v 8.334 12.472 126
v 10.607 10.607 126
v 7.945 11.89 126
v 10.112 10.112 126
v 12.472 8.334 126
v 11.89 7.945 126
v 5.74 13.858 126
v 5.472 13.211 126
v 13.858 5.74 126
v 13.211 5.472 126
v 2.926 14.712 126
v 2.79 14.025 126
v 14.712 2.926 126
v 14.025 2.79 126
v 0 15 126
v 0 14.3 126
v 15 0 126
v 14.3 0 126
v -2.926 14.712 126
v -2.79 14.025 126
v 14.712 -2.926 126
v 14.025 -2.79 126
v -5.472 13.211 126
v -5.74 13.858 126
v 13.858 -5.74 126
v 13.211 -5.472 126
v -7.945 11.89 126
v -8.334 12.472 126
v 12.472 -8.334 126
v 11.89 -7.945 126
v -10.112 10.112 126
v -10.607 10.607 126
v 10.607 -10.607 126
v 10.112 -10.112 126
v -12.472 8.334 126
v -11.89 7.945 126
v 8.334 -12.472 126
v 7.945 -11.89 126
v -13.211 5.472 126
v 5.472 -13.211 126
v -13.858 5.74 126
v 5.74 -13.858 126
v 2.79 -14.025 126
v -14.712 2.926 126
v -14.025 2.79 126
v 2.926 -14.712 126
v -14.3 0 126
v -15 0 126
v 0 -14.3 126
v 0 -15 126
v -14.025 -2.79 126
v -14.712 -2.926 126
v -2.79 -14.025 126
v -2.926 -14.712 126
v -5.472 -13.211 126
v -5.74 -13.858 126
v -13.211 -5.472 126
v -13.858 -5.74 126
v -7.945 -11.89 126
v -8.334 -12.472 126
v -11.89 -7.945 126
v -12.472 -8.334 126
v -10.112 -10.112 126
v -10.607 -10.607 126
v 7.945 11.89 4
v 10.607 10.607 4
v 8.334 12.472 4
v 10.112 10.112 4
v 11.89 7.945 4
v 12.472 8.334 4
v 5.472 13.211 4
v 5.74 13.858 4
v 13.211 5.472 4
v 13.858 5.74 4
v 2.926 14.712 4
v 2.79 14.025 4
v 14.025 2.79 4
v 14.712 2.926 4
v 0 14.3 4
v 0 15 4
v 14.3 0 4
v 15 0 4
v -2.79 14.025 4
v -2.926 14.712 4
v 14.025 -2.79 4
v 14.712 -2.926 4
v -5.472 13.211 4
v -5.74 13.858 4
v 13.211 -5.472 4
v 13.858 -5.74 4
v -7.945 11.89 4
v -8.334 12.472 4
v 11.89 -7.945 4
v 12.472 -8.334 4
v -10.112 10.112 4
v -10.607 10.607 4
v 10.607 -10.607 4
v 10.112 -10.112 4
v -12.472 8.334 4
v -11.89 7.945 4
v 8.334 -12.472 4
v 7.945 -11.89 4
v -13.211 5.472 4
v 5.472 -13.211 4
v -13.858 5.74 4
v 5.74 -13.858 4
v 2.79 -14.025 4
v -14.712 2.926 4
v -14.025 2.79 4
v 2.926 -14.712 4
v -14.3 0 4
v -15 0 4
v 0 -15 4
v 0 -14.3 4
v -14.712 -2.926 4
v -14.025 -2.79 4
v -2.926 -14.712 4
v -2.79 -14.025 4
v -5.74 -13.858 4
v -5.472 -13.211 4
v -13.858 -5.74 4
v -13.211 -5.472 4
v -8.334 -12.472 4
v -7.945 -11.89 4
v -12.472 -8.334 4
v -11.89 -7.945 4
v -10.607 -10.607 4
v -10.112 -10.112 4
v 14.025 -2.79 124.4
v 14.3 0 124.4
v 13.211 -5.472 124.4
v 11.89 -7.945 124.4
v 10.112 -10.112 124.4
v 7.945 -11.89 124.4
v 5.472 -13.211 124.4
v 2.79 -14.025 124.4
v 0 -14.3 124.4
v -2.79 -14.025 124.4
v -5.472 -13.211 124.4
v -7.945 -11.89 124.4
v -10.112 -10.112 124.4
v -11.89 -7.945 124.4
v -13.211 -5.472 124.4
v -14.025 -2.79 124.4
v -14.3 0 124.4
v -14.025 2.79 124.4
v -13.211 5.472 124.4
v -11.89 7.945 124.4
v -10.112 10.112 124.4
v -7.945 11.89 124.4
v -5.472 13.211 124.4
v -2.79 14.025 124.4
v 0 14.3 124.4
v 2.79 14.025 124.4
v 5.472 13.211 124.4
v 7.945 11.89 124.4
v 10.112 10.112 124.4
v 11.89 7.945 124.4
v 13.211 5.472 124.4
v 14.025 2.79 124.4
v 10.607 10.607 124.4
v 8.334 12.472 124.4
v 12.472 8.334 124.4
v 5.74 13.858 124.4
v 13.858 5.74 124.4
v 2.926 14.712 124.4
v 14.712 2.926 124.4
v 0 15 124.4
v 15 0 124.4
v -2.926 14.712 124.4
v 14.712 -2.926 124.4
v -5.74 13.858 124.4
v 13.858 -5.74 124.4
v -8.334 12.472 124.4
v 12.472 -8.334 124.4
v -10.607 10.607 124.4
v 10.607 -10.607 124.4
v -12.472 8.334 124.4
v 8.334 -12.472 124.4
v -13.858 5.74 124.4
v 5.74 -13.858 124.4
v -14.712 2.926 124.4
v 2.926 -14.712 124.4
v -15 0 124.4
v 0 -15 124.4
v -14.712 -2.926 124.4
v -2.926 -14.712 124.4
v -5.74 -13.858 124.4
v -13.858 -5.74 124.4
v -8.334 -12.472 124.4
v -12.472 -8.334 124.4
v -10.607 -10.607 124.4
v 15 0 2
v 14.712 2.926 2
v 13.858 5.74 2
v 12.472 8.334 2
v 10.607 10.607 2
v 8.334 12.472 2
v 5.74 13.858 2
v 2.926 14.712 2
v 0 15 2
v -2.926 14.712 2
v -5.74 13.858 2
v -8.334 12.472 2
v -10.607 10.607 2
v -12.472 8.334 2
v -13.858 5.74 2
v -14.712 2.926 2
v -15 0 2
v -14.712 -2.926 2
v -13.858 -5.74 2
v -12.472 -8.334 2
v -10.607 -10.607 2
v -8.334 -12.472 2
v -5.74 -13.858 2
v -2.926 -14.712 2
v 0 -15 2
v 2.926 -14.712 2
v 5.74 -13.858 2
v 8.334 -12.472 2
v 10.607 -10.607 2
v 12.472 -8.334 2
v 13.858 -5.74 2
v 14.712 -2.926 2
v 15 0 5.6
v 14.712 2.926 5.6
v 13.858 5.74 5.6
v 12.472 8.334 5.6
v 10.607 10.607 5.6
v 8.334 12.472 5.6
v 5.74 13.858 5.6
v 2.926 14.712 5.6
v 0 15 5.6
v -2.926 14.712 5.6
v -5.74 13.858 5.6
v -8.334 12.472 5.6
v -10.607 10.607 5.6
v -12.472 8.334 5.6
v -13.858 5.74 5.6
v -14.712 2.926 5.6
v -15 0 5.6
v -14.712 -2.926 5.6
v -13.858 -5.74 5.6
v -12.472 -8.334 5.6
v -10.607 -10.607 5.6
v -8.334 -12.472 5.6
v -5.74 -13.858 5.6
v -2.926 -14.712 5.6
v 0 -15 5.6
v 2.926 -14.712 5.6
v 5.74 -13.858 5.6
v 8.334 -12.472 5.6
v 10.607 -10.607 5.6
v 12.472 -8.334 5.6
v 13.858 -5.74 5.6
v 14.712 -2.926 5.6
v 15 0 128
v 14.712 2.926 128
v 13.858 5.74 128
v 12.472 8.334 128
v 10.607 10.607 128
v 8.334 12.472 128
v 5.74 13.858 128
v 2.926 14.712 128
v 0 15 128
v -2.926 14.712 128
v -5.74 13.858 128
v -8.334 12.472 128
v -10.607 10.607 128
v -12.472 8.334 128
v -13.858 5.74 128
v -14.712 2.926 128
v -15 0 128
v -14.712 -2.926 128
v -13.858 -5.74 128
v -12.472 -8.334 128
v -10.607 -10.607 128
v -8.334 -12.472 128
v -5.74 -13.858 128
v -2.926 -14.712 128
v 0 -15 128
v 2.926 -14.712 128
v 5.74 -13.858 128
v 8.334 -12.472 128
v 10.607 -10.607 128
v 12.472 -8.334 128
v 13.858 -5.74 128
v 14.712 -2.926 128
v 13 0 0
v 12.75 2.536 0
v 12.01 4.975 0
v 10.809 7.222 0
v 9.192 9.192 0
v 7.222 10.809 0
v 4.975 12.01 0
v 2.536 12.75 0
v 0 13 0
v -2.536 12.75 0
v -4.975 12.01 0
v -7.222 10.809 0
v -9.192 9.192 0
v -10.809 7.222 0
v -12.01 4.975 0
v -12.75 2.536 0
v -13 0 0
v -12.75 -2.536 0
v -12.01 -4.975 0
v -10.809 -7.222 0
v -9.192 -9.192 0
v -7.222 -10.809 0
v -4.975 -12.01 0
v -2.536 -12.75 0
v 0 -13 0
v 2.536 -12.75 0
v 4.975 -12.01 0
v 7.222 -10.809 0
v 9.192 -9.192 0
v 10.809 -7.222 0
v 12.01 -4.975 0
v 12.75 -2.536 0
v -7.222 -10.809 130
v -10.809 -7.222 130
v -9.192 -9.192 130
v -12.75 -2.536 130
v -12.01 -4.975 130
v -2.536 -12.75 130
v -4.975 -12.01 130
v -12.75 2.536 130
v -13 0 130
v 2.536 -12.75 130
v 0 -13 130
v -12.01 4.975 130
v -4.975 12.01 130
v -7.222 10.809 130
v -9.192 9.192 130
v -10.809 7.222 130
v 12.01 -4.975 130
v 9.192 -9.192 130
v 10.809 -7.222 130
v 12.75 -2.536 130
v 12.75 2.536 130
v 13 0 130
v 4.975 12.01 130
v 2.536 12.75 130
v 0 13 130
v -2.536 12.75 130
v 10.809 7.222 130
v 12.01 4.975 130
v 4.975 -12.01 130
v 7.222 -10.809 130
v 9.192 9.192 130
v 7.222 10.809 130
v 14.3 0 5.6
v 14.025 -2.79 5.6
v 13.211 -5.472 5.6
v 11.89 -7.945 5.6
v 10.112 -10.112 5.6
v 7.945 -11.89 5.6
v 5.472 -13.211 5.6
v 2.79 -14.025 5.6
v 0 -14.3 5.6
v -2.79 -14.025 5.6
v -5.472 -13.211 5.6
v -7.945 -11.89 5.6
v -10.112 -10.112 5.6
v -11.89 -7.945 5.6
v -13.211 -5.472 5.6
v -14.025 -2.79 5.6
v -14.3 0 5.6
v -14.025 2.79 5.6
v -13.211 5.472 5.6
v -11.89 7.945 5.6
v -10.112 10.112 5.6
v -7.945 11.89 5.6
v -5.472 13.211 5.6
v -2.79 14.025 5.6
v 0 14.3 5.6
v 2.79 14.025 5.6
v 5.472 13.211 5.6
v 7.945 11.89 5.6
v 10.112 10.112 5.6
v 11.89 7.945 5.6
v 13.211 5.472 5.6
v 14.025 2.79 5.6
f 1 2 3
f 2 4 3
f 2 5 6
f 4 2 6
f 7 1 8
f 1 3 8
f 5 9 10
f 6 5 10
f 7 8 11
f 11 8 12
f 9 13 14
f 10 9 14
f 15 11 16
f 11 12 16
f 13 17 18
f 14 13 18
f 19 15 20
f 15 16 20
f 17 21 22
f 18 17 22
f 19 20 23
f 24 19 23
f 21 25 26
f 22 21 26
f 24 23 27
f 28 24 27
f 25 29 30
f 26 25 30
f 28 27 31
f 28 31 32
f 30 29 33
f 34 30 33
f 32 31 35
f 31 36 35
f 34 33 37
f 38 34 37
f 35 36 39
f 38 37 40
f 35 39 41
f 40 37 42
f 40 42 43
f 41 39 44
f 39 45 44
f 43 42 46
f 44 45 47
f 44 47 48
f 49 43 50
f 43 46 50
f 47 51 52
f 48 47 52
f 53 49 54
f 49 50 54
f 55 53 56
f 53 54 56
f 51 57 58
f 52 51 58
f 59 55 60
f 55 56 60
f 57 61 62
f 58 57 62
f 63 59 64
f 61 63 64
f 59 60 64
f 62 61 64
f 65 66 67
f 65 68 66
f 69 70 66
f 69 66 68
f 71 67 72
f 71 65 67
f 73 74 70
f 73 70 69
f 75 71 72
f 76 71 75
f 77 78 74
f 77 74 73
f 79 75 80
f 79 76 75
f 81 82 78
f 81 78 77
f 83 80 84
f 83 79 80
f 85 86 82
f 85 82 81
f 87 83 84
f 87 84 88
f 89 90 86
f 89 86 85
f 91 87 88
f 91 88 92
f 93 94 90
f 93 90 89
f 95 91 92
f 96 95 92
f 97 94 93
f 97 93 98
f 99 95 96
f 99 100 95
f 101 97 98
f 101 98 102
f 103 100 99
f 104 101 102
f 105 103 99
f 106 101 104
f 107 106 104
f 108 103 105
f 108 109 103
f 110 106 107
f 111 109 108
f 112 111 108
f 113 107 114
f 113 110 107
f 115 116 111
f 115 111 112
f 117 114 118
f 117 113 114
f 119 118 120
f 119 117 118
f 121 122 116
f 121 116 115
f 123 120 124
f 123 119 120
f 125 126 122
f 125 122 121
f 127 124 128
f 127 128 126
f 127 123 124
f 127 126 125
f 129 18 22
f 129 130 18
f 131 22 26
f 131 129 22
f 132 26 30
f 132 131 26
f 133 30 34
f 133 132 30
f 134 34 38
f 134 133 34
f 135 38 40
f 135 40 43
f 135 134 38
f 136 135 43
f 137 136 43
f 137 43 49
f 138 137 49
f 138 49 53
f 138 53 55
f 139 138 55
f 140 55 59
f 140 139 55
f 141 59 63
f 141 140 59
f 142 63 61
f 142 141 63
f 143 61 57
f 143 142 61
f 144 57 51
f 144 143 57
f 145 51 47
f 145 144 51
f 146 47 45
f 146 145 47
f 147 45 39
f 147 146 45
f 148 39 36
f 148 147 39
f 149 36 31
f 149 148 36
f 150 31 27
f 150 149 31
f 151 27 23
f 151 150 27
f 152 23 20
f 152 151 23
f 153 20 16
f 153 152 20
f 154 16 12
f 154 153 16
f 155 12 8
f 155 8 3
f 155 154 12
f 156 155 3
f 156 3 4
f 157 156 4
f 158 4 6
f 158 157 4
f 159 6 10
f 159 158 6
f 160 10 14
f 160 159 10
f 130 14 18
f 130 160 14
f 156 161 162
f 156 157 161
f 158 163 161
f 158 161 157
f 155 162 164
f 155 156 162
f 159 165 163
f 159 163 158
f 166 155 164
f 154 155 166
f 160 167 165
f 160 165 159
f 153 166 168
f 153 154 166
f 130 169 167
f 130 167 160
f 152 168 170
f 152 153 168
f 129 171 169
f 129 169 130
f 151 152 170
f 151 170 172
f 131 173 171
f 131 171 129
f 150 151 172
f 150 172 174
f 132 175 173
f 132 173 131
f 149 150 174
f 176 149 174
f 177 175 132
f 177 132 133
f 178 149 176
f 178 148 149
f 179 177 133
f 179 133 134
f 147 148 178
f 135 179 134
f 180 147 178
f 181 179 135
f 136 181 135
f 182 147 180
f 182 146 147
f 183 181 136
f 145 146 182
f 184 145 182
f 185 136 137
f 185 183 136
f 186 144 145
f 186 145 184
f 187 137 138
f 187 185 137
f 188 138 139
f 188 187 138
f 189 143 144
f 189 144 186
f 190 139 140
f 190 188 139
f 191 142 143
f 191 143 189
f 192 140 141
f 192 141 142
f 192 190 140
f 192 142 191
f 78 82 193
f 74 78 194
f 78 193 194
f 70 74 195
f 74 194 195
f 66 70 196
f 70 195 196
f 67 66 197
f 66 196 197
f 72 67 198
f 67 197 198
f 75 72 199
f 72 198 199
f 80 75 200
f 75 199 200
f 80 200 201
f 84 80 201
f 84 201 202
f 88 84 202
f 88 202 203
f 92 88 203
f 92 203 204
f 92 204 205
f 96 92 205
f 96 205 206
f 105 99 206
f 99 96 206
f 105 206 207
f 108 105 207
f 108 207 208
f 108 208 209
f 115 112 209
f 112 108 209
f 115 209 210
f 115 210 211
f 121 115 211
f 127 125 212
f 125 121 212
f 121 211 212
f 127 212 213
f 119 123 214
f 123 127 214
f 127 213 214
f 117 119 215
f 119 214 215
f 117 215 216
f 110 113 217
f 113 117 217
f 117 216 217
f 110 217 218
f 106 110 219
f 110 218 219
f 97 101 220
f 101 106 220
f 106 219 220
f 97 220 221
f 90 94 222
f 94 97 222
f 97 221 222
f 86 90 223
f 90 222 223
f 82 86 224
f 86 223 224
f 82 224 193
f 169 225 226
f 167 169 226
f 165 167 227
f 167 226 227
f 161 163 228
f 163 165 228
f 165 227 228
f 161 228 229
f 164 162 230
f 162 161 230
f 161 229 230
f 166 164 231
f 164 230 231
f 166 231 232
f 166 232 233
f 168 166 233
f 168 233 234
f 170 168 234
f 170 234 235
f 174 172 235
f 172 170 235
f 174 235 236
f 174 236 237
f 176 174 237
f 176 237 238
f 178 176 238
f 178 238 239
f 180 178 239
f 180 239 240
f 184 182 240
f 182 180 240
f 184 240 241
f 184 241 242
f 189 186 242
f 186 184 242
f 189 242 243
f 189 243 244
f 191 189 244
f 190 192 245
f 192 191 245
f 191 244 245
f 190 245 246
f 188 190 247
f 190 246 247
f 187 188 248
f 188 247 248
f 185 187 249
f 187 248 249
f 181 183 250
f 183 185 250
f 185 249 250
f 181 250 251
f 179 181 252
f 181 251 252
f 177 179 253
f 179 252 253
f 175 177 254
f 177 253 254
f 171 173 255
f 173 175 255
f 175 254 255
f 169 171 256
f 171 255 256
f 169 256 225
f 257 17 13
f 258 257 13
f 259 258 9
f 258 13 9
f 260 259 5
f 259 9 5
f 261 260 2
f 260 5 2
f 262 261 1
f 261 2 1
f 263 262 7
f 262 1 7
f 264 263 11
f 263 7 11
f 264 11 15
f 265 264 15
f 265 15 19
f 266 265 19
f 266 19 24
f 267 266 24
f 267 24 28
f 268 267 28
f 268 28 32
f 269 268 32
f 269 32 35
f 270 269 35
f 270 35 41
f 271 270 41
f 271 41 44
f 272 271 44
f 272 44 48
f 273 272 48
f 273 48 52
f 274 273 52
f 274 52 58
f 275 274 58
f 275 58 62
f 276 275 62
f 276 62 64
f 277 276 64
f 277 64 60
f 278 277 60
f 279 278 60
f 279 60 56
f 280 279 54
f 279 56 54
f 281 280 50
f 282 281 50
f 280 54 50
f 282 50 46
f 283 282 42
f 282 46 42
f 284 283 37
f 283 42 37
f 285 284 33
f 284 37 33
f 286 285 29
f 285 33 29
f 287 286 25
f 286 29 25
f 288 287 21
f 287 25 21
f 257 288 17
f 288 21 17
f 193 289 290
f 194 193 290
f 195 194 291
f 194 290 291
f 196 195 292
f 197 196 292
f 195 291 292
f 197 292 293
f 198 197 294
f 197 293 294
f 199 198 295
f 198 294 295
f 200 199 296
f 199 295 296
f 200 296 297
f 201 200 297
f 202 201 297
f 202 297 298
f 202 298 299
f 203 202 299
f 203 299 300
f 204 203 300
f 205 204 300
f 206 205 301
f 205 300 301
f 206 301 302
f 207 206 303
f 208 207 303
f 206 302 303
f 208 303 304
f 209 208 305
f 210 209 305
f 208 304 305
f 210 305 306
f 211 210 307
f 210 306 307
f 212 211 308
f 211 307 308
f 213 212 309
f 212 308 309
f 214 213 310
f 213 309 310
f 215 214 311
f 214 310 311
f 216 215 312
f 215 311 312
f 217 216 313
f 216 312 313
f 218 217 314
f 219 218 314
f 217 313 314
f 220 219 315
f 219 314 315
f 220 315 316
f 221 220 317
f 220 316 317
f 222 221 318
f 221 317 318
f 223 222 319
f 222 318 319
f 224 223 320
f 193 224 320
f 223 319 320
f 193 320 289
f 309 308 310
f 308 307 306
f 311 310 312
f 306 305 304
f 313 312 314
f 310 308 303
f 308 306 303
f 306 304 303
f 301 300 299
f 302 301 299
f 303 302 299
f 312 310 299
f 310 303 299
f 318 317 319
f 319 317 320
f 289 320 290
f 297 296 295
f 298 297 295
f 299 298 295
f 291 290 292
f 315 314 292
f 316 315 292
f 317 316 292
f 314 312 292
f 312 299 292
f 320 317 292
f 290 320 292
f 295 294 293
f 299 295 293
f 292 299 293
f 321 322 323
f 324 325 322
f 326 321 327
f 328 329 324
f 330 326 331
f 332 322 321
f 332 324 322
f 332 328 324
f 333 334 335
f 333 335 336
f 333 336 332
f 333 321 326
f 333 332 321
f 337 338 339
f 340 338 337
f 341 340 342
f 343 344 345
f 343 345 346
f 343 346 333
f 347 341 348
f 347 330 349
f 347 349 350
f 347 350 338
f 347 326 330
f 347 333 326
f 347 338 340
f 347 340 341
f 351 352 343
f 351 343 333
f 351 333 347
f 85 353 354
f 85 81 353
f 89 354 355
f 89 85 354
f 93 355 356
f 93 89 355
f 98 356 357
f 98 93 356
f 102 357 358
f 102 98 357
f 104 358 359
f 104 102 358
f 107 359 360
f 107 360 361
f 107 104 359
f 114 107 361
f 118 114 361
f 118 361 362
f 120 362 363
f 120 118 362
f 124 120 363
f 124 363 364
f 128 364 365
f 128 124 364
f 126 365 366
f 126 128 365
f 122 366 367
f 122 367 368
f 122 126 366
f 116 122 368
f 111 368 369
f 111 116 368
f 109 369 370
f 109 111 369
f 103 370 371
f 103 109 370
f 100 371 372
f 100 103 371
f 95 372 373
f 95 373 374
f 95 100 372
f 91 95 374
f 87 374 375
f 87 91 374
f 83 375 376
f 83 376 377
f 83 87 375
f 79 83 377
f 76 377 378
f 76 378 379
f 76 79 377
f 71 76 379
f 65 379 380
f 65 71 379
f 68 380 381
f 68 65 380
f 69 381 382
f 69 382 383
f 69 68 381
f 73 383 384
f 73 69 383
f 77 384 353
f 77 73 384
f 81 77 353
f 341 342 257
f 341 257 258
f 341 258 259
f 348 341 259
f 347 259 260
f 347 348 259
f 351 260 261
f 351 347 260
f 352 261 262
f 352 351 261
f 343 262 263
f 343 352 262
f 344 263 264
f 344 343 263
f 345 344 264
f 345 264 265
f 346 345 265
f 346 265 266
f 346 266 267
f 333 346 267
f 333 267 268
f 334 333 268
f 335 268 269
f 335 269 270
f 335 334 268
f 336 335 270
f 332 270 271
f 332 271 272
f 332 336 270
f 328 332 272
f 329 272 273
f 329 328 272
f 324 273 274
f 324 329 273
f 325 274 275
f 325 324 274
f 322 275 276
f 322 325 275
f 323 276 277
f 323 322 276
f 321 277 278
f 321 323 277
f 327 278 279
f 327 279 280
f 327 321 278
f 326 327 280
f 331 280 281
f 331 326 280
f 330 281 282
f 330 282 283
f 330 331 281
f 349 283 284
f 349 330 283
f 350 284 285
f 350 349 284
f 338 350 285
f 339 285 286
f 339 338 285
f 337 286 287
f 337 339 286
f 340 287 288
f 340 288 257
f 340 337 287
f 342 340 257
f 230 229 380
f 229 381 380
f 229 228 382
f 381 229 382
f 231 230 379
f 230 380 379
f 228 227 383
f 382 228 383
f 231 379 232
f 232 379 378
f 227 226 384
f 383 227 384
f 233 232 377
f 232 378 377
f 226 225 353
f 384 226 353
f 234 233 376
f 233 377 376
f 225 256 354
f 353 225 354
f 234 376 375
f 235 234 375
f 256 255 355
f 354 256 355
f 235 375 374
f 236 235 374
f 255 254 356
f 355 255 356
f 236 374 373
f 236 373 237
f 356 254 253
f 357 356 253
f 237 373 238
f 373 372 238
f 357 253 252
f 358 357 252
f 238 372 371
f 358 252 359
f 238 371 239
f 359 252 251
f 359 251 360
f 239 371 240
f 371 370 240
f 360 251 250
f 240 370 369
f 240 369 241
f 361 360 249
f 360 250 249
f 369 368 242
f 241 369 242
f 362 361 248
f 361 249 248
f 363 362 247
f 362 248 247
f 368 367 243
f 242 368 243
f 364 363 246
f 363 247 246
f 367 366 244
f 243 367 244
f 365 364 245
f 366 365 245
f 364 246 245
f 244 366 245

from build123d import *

# Parameters (mm, degrees)
SKETCH1_R           = 15
BOSS_EXTRUDE1_DEPTH = 130
CHAMFER1_SIZE       = 2
SKETCH2_W           = 1.6
SKETCH2_H           = 0.7


with BuildPart() as part:
    # Sketch1 → Boss-Extrude1 (new body)
    with BuildSketch(Plane.XY):
        Circle(SKETCH1_R)
    extrude(amount=BOSS_EXTRUDE1_DEPTH)

    # Chamfer1
    chamfer1_edges = [part.edges().sort_by_distance(p)[0] for p in [
        (-15, 0, 0),
        (-15, 0, 130),
    ]]
    chamfer(chamfer1_edges, length=CHAMFER1_SIZE)

    # Sketch2 → Cut-Revolve1 (revolve, cut)
    with BuildSketch(Plane(origin=(0, 0, 0), x_dir=(0, 0, -1), z_dir=(1, 0, 0)), mode=Mode.PRIVATE) as cut_revolve1_sk:
        with Locations((-125.2, 14.65)):
            Rectangle(SKETCH2_W, SKETCH2_H)
        with Locations((-4.8, 14.65)):
            Rectangle(SKETCH2_W, SKETCH2_H)
    revolve(cut_revolve1_sk.sketch.rotate(Axis((0, 0, 130), (0, 0, -1)), 90), axis=Axis((0, 0, 130), (0, 0, -1)), mode=Mode.SUBTRACT)


solid = part.part
